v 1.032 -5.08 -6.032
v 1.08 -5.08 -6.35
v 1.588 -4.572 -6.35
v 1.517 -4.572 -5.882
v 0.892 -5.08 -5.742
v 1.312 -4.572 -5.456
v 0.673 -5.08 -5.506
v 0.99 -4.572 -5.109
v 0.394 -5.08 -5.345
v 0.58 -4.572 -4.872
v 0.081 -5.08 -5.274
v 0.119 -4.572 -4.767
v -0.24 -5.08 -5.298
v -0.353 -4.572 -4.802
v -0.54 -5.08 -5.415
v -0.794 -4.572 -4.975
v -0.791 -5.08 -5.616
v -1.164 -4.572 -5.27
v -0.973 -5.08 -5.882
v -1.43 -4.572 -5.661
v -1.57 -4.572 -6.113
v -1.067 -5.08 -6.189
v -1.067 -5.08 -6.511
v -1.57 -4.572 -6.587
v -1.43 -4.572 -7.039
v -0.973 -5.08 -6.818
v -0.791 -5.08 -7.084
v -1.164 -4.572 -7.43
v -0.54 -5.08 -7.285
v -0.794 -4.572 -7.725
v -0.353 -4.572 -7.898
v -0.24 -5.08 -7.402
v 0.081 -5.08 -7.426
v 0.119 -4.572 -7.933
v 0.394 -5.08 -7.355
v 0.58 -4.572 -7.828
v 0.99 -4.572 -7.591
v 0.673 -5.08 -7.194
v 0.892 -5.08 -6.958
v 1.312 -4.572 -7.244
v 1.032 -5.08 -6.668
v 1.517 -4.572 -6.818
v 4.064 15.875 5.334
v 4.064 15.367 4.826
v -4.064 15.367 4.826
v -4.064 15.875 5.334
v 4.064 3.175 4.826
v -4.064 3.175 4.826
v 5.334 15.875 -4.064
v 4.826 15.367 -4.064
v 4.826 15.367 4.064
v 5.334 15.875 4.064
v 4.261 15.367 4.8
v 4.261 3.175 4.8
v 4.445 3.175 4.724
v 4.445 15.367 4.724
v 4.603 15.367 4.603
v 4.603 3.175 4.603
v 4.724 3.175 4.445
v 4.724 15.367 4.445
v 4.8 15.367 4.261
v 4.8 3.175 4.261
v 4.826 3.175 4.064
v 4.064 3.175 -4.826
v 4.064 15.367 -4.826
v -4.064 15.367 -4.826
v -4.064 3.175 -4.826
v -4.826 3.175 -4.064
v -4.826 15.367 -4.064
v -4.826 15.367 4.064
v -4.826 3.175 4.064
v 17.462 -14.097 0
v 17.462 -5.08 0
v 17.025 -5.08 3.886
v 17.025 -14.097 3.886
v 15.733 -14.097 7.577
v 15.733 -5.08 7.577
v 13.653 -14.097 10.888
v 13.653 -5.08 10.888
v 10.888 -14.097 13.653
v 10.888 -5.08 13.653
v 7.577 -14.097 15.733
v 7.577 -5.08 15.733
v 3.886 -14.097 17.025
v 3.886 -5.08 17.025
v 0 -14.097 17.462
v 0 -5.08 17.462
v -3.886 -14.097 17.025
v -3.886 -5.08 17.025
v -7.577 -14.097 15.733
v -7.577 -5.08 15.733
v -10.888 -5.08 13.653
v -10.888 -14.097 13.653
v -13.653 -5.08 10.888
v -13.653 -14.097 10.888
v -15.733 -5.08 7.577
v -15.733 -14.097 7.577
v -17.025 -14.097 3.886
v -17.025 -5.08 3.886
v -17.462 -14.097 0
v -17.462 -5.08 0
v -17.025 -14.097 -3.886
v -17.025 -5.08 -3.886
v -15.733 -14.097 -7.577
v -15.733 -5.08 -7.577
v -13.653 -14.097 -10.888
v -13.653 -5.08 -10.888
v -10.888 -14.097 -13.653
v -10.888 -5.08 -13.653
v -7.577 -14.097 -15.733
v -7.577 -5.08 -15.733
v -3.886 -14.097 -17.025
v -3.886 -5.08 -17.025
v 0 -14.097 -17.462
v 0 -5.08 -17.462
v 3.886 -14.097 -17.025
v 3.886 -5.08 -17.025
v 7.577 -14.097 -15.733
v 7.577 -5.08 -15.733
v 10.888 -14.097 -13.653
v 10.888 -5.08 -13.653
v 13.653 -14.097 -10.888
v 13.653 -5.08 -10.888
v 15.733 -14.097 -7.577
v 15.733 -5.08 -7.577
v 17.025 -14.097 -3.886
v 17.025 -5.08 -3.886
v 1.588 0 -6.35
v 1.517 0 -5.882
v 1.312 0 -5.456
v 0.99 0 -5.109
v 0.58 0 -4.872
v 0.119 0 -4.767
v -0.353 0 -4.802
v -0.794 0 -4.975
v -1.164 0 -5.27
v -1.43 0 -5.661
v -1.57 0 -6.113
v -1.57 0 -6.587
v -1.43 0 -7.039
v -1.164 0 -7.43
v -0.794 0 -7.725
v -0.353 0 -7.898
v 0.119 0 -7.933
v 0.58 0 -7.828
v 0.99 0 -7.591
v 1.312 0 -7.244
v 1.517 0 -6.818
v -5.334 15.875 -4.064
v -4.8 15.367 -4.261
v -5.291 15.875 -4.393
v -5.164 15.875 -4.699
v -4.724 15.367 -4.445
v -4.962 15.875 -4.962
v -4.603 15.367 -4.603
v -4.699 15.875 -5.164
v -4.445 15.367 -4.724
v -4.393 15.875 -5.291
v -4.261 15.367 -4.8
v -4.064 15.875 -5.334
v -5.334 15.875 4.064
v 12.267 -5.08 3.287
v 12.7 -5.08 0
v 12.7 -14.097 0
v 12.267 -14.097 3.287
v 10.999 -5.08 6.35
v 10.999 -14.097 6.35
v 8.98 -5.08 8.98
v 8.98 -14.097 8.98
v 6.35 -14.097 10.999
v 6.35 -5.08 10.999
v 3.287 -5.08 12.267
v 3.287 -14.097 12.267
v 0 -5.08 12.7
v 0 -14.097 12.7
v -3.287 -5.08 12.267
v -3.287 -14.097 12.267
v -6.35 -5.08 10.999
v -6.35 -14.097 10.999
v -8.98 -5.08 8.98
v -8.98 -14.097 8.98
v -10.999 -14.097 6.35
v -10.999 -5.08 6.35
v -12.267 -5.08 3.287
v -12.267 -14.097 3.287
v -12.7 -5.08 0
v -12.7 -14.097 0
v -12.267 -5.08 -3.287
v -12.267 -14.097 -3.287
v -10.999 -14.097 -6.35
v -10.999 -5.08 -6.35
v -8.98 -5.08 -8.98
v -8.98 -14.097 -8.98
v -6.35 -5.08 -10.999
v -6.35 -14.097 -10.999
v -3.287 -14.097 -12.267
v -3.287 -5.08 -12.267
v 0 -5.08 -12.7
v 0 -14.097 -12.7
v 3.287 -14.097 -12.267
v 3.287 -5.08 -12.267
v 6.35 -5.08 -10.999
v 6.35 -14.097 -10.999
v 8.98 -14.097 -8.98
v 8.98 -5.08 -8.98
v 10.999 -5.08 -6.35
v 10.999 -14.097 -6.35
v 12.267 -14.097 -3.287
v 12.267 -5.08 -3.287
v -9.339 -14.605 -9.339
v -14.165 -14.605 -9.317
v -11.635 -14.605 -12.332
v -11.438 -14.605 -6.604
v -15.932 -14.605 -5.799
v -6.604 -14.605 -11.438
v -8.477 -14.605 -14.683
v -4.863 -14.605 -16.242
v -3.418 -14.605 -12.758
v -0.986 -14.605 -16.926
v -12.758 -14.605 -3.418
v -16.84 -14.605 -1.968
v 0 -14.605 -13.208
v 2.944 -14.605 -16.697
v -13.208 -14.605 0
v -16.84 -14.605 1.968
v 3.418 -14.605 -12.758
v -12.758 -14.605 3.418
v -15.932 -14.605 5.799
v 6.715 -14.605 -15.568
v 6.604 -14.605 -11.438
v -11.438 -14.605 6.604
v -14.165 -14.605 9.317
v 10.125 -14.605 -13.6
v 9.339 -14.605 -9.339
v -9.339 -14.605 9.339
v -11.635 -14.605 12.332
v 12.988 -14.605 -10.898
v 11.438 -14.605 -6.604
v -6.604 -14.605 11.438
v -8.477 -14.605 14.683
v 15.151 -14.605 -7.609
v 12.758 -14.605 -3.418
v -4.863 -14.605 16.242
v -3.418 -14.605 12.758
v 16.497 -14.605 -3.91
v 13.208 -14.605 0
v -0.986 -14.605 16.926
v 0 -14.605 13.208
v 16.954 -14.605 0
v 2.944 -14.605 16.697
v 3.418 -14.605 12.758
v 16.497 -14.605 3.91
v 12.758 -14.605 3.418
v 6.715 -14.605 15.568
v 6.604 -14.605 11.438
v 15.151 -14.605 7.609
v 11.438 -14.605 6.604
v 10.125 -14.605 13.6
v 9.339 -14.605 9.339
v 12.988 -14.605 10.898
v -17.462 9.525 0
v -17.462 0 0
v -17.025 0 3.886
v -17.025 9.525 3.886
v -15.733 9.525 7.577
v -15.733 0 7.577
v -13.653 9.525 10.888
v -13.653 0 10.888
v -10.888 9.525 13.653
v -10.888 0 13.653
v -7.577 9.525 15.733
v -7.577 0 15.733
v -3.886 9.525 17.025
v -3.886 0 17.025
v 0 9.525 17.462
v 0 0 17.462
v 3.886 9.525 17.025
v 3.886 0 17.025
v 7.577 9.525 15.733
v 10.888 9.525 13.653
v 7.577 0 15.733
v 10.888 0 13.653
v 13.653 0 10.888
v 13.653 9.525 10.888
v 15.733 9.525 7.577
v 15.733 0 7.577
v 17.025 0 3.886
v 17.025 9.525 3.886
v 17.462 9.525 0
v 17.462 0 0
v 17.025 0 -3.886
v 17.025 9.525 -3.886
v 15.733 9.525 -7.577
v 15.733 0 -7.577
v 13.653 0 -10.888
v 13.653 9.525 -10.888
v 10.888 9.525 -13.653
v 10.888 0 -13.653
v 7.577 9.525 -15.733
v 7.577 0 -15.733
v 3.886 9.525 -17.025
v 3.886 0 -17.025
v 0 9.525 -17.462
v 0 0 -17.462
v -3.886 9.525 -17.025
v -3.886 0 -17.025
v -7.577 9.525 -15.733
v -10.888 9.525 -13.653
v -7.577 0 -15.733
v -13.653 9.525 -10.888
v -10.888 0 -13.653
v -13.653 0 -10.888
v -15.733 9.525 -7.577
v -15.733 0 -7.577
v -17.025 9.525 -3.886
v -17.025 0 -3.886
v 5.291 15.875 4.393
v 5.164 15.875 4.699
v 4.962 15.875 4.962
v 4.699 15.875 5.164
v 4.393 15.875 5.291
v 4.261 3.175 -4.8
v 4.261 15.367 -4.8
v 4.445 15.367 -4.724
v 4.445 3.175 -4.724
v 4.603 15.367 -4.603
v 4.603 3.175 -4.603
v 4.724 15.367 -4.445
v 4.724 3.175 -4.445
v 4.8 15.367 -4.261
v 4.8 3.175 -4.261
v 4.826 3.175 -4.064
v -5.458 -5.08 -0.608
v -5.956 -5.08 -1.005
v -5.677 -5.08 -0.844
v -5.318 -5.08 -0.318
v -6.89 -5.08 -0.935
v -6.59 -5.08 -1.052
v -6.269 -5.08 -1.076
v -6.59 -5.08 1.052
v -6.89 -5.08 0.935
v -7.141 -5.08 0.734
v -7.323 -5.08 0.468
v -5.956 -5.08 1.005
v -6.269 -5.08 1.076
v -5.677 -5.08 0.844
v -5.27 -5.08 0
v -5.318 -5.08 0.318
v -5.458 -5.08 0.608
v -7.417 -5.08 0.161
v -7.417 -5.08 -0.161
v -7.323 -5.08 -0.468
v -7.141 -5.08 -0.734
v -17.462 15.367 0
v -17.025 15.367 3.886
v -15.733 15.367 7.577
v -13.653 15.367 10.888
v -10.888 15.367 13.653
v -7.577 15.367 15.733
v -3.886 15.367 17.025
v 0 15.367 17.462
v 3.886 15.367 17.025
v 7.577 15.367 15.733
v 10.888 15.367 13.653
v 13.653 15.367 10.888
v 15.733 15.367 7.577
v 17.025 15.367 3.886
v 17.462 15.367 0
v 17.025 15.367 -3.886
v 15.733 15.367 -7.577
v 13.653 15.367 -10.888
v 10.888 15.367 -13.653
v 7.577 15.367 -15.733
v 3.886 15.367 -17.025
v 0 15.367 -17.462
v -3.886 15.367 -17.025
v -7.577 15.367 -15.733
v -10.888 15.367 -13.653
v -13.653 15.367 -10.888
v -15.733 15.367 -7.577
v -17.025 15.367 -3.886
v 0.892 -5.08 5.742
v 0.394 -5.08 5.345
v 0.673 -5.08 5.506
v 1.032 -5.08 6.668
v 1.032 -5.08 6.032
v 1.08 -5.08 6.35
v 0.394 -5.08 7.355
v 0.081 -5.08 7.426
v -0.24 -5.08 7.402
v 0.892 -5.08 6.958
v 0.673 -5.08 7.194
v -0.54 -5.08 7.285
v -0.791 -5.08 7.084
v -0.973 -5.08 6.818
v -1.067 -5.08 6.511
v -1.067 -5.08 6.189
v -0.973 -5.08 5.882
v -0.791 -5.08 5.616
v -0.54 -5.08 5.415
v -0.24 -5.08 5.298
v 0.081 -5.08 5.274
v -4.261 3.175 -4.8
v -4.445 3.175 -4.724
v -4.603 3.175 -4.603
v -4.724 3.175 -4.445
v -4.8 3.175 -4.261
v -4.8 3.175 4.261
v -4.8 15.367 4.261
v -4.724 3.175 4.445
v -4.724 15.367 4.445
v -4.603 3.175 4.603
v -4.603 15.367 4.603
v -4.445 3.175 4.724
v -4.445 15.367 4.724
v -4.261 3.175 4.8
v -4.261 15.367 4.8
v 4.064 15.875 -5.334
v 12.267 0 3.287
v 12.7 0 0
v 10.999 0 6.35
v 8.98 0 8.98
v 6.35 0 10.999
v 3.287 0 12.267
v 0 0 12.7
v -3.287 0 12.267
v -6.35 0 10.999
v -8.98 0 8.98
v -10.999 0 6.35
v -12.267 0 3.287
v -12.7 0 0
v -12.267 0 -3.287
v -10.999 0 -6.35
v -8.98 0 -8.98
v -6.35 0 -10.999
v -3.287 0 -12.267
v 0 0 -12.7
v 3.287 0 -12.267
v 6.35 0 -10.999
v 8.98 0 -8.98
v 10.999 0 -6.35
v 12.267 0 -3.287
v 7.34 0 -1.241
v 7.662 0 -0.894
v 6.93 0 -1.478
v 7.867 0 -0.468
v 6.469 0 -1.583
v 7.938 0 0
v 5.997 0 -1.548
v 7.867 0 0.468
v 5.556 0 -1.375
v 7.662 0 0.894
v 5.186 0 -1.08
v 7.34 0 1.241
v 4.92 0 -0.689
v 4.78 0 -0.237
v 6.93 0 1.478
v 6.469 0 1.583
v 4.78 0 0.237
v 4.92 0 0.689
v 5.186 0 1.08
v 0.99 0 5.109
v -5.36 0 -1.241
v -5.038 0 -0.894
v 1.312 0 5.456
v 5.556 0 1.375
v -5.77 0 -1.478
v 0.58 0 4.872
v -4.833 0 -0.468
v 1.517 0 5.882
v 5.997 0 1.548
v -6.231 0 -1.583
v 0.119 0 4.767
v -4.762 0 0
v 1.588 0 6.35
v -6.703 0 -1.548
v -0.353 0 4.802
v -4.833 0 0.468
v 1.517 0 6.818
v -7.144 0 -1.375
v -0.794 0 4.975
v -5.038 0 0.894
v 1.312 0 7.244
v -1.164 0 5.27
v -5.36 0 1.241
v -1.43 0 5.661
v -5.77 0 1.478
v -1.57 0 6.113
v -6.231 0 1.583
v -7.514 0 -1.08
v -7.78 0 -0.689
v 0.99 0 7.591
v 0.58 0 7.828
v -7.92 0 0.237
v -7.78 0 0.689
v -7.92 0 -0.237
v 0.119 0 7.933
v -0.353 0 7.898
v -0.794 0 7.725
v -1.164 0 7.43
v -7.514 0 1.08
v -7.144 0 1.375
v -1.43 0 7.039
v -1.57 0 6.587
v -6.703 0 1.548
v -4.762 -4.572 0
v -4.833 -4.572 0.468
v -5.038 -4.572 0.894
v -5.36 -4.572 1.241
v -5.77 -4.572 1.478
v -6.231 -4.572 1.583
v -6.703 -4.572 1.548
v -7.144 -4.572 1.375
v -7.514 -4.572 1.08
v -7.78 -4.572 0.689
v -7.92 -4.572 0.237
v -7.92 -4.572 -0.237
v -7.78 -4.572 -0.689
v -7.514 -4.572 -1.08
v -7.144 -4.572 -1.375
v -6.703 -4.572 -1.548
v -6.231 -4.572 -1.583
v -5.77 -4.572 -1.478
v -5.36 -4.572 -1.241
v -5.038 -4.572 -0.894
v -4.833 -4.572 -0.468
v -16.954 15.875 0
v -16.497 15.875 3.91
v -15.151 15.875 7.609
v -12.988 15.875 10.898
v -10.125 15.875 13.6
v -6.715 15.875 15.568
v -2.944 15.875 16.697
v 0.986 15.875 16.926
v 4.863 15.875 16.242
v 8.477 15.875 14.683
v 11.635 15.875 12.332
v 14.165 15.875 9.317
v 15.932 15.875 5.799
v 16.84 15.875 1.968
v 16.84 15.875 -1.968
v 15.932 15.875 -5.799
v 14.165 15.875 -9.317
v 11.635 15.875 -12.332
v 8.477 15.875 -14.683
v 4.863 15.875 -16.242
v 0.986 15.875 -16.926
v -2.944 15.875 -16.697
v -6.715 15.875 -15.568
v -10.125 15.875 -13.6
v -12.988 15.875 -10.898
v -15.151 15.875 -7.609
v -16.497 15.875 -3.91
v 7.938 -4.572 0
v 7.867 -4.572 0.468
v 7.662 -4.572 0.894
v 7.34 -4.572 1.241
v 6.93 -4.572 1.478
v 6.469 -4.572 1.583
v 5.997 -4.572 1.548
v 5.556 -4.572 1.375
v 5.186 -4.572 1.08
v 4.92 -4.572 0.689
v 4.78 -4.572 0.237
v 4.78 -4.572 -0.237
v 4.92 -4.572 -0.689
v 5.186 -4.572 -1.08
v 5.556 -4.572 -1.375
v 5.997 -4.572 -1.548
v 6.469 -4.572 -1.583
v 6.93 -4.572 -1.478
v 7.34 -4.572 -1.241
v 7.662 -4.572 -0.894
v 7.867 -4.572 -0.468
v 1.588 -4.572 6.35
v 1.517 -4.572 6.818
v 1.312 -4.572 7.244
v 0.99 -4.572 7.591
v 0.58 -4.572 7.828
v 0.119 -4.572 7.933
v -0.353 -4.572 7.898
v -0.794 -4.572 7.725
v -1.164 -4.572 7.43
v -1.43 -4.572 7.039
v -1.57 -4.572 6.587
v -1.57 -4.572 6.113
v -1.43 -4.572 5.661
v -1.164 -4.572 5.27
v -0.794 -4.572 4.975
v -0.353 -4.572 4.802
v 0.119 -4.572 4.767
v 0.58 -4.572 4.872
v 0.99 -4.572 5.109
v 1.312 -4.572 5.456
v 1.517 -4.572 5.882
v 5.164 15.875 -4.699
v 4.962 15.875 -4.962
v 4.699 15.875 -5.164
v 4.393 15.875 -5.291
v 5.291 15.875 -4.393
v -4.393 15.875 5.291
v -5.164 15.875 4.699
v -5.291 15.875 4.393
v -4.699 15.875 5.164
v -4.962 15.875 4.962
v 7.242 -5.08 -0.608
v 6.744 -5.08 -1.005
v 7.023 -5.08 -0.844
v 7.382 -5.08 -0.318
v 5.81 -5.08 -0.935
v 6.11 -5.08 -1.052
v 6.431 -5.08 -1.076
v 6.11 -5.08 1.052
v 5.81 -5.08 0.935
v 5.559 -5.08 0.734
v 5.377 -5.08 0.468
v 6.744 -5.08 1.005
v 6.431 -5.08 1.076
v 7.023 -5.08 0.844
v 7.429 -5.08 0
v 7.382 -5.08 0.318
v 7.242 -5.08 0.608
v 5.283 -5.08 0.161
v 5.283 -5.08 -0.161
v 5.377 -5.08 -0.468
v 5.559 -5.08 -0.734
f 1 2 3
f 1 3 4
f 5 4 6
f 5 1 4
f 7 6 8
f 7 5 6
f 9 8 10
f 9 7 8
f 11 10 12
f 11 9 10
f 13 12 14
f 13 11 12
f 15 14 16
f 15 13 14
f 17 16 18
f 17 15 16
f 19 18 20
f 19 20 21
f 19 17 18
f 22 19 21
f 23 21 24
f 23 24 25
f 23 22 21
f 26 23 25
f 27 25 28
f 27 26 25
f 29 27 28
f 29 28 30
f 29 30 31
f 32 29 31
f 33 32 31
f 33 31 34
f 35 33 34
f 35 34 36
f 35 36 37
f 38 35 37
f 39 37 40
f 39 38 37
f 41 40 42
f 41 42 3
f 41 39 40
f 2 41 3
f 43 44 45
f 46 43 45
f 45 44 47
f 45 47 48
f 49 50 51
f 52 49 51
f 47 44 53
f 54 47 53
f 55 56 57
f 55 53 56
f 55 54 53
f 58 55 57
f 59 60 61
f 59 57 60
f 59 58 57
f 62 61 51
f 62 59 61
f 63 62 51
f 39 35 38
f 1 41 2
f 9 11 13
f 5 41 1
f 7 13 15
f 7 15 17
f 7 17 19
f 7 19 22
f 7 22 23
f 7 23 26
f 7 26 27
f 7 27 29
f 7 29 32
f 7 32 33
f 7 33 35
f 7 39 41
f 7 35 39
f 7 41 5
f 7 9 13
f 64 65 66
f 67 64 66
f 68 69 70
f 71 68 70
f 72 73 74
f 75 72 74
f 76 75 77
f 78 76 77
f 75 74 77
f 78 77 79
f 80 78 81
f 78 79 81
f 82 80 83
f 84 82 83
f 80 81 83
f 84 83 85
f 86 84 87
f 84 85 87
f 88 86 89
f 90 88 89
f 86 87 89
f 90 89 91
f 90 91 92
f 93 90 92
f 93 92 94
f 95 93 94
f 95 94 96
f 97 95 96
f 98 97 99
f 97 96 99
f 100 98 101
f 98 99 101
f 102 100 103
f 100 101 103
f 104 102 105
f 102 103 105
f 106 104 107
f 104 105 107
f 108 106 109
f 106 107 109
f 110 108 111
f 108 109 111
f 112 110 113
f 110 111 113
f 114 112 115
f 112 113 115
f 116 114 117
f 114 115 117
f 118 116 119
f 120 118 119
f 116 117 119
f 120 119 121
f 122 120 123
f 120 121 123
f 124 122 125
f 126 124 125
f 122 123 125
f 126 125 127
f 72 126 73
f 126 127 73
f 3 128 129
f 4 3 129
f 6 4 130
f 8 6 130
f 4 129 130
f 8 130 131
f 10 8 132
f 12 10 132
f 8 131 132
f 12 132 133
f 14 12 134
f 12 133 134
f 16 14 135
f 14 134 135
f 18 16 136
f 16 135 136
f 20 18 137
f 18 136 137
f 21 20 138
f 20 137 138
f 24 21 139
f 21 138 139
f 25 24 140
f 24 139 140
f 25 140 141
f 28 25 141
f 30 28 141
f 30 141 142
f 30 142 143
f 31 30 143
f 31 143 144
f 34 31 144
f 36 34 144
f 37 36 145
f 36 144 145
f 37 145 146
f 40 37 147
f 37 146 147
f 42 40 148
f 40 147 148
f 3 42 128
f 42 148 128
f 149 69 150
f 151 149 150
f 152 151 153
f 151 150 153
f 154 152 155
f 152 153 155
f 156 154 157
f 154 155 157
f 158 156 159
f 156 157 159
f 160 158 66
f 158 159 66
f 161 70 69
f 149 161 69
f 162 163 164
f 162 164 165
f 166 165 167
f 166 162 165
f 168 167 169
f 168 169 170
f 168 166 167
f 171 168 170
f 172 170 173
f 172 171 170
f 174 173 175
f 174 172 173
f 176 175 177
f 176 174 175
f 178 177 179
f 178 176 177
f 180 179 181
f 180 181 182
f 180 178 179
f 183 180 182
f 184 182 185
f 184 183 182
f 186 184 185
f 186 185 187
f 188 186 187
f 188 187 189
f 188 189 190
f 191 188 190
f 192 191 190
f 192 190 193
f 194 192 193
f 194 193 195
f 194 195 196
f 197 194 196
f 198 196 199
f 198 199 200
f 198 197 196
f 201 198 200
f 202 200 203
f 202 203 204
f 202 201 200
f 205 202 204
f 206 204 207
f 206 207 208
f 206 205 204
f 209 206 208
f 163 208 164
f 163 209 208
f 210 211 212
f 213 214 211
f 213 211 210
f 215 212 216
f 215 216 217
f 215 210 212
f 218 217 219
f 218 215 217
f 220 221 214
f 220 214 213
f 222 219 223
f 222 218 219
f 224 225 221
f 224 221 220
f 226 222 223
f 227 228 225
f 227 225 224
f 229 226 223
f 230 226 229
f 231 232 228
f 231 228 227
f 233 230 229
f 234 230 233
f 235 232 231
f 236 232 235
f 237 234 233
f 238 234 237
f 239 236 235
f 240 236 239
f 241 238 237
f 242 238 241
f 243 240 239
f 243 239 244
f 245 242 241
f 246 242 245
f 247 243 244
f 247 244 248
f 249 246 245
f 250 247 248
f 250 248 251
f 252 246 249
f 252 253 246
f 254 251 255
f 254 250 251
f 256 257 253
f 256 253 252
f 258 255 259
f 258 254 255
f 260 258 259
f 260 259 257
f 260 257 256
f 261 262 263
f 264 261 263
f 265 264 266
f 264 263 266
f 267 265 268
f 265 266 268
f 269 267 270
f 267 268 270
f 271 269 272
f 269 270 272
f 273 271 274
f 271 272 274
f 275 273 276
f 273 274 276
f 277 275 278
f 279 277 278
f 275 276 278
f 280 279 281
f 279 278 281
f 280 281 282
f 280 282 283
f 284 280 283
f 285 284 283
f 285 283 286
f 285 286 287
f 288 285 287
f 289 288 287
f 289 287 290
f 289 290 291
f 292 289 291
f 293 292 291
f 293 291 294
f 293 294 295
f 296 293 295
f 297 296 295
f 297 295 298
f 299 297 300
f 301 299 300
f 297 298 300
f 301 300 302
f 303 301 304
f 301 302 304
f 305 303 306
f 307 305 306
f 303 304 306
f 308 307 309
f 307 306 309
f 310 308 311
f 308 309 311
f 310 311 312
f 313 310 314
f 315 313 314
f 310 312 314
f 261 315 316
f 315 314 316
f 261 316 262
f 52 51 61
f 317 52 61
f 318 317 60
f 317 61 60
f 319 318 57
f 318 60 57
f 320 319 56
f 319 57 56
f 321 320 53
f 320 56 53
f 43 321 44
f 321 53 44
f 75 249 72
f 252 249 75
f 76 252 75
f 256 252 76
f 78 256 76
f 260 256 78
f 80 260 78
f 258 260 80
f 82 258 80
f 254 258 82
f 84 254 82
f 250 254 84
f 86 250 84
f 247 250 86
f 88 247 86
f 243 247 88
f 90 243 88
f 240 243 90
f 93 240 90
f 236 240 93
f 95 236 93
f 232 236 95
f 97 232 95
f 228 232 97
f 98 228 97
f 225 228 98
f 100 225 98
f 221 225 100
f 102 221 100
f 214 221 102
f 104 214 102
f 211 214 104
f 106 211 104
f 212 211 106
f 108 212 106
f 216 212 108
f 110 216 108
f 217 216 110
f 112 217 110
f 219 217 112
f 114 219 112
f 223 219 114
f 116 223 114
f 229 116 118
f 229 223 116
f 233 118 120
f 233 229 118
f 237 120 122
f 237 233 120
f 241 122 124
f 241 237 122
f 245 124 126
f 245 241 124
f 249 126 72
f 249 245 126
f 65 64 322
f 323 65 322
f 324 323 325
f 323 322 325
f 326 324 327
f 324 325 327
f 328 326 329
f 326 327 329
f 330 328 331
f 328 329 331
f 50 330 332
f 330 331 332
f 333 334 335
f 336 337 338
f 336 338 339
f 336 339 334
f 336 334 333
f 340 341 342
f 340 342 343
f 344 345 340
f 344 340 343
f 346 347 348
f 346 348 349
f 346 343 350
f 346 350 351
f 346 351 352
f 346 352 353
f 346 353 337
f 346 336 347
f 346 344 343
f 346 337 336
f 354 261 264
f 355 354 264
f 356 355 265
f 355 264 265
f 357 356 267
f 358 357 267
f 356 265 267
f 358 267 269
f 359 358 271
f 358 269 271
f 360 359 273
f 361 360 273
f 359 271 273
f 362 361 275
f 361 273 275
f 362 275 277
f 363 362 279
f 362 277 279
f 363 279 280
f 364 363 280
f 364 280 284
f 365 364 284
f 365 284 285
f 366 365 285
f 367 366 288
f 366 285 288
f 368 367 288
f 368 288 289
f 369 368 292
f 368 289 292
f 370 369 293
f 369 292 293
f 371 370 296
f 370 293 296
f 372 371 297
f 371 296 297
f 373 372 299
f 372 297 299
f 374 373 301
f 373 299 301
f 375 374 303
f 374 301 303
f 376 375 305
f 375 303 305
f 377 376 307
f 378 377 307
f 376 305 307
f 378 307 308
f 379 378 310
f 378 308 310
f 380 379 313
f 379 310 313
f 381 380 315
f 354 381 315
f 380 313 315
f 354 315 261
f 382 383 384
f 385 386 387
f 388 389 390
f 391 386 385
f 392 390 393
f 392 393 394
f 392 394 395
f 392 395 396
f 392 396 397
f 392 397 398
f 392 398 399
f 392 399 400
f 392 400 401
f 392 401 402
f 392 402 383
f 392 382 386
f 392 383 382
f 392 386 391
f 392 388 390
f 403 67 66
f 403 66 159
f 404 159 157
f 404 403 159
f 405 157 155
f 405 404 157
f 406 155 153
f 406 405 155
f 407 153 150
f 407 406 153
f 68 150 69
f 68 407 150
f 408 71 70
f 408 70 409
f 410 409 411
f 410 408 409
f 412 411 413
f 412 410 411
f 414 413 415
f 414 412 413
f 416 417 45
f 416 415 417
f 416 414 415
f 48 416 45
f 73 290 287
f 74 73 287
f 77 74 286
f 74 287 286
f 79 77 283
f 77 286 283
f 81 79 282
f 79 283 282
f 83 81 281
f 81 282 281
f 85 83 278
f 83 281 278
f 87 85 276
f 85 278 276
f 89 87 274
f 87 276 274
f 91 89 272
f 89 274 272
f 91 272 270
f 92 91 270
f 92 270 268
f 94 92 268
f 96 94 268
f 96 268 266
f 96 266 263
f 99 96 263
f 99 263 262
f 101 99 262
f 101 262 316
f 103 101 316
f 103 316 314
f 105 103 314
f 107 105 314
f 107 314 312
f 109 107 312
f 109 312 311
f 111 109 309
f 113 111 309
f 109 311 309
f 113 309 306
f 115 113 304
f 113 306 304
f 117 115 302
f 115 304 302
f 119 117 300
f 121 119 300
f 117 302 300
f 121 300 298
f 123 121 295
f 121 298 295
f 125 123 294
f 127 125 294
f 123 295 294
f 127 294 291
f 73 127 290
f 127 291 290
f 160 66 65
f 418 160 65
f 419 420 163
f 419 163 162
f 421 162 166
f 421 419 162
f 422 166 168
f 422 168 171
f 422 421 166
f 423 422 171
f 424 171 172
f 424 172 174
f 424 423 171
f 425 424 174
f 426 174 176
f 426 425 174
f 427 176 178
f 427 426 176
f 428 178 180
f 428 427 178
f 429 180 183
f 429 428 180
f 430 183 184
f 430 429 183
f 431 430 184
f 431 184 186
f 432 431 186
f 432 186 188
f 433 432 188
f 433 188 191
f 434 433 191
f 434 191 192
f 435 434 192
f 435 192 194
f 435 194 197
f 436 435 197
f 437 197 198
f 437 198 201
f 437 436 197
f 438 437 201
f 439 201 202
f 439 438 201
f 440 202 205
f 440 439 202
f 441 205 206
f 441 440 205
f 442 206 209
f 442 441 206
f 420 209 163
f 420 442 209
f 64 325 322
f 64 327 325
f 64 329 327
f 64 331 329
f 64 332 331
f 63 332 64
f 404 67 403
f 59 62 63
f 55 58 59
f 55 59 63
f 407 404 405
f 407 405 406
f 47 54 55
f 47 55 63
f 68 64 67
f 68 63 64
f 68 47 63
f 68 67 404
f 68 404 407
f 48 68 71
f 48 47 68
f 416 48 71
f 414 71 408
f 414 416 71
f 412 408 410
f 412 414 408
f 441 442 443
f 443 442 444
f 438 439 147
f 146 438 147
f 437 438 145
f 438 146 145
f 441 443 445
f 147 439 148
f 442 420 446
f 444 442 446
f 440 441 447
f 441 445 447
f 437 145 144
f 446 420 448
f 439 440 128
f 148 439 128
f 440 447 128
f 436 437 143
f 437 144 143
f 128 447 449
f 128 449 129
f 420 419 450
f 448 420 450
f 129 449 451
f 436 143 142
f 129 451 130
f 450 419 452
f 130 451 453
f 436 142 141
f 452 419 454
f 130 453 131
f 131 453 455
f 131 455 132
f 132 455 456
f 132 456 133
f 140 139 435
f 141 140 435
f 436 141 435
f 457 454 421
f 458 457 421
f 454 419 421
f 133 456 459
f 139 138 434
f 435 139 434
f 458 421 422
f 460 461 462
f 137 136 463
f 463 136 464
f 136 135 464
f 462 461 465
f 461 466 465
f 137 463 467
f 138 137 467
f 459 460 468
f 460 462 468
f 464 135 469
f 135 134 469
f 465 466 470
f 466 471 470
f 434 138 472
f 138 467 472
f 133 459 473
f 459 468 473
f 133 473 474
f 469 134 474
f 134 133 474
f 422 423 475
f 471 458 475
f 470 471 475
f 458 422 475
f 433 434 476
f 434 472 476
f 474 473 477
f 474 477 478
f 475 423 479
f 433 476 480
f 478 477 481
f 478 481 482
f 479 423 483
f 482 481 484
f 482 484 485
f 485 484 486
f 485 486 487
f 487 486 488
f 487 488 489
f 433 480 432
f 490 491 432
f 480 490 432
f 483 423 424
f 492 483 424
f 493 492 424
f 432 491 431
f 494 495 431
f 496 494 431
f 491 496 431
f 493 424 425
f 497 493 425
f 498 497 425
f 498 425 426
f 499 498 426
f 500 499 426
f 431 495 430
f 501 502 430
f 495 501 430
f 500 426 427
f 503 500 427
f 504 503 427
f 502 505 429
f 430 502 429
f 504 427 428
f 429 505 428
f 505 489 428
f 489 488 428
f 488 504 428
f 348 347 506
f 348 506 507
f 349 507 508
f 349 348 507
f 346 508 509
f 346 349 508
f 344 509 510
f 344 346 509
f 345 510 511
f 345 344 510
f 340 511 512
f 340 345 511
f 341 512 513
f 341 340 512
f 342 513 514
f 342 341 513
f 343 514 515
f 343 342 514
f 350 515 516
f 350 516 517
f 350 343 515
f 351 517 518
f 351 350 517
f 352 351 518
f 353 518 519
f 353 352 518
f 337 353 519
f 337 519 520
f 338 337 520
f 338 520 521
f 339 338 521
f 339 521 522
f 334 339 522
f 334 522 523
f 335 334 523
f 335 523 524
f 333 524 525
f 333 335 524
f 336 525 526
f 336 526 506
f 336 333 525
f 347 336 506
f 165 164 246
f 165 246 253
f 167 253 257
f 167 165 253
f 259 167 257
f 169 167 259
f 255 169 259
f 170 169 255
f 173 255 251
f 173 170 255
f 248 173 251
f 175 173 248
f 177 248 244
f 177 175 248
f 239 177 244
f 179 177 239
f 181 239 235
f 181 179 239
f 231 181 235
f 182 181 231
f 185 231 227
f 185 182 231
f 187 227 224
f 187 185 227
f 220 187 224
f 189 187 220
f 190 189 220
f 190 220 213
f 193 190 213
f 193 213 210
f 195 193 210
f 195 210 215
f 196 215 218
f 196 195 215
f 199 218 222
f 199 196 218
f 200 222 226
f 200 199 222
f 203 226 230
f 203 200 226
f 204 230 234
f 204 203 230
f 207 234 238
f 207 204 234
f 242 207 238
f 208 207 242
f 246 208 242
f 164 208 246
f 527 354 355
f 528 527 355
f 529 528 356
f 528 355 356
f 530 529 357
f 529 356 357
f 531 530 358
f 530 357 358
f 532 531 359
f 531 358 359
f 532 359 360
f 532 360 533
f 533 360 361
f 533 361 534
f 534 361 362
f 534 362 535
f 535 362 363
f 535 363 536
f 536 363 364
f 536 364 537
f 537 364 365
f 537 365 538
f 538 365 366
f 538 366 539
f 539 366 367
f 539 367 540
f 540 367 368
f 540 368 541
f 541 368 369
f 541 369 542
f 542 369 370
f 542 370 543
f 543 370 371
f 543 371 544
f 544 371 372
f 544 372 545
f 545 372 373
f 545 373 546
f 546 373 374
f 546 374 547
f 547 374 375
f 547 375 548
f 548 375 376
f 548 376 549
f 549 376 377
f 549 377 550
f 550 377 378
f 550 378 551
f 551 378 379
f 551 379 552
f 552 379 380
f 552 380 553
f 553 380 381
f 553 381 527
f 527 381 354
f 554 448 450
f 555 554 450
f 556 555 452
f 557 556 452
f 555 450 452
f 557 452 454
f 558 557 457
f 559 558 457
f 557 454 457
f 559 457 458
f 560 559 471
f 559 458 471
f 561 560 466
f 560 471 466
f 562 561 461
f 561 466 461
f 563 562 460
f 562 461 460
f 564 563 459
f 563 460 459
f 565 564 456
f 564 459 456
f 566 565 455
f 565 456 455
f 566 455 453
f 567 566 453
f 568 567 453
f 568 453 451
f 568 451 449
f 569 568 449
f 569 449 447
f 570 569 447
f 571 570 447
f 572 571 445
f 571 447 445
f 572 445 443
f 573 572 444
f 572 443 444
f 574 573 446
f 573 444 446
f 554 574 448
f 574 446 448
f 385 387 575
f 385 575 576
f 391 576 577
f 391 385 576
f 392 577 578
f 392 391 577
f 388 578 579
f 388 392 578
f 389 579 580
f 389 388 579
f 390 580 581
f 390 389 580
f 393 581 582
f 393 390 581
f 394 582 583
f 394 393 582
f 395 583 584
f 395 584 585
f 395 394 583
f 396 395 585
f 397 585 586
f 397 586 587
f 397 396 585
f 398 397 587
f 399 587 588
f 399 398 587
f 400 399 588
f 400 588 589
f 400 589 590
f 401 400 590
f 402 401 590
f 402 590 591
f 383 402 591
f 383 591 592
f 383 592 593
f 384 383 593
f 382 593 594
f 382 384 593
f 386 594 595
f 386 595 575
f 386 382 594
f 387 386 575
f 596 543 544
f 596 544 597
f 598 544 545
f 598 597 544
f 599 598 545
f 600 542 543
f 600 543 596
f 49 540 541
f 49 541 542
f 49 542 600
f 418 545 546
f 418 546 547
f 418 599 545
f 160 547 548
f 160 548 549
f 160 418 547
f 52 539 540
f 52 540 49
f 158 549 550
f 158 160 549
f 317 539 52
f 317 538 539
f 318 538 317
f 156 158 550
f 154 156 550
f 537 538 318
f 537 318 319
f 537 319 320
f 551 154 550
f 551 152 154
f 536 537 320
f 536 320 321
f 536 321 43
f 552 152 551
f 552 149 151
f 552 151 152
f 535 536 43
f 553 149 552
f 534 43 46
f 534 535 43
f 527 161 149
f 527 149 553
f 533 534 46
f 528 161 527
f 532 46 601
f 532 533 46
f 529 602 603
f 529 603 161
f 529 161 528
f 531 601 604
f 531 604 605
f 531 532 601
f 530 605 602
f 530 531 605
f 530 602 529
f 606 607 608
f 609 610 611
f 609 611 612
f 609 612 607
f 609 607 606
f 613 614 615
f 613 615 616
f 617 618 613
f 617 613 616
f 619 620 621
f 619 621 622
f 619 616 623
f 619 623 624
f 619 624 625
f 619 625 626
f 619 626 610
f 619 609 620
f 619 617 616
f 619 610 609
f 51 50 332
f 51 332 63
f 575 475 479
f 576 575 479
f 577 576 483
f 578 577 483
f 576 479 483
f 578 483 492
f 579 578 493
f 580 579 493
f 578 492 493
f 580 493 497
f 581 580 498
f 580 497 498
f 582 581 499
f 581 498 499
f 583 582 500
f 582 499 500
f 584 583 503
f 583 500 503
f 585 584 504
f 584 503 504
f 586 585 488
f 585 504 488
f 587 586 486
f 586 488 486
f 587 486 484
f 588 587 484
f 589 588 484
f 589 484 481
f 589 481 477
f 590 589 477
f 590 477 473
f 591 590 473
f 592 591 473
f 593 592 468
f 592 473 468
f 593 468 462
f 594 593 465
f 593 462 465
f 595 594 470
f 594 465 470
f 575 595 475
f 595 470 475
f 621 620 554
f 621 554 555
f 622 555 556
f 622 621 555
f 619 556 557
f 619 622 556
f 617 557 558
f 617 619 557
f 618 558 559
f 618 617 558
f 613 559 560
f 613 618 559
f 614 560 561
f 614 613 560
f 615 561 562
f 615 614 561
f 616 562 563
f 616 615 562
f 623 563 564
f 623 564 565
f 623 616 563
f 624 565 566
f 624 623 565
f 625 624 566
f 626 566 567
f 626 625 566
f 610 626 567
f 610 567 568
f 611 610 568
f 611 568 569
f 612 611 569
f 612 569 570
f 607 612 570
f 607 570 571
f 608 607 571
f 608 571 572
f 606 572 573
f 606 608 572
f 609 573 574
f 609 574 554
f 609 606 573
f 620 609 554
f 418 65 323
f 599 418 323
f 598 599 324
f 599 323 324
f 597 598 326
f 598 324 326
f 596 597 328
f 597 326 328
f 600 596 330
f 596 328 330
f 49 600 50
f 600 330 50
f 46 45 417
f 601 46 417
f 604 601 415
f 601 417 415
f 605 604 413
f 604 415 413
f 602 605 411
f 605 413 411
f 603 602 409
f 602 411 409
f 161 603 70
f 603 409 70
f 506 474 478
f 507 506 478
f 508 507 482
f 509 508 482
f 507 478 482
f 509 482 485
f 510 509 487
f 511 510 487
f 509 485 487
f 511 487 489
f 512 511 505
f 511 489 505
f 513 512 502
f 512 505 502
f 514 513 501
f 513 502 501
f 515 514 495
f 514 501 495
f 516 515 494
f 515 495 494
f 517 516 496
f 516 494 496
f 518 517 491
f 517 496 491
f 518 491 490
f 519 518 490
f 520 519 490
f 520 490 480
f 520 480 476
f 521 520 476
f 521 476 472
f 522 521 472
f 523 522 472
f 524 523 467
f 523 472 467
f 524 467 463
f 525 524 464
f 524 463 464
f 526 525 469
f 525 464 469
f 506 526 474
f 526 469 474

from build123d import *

# Parameters (mm, degrees)
F0_R     = 17.4625
F0_R_2   = 12.7
F1_DEPTH = 5.08
F0_R_3   = 1.5875
F2_R     = 17.4625
F3_DEPTH = 9.525
F4_DEPTH = 9.525
F5_DEPTH = 6.35
F6_W     = 9.652
F6_H     = 9.652
F7_DEPTH = 12.7
F8_R     = 0.762
F9_SIZE  = 0.508


with BuildPart() as f1:
    # F0 (on Front) → F1 (new body)
    with BuildSketch(Plane.XZ):
        Circle(F0_R)
        Circle(F0_R_2, mode=Mode.SUBTRACT)
    extrude(amount=F1_DEPTH)



with BuildPart() as f1b:
    # F0 (on Front) → F1, piece 2 (new body)
    with BuildSketch(Plane.XZ):
        with Locations((0, 6.35)):
            Circle(F0_R_3)
    extrude(amount=F1_DEPTH)


with BuildPart() as f1c:
    # F0 (on Front) → F1, piece 3 (new body)
    with BuildSketch(Plane.XZ):
        with Locations((6.35, 0)):
            Circle(F0_R_3)
    extrude(amount=F1_DEPTH)


with BuildPart() as f1d:
    # F0 (on Front) → F1, piece 4 (new body)
    with BuildSketch(Plane.XZ):
        with Locations((0, -6.35)):
            Circle(F0_R_3)
    extrude(amount=F1_DEPTH)


with BuildPart() as f1e:
    # F0 (on Front) → F1, piece 5 (new body)
    with BuildSketch(Plane.XZ):
        with Locations((-6.35, 0)):
            Circle(F0_R_3)
    extrude(amount=F1_DEPTH)


with BuildPart() as f1_1:
    add(f1.part)

    add(f1b.part)  # F3 merges F1b

    add(f1c.part)  # F3 merges F1c

    add(f1d.part)  # F3 merges F1d

    add(f1e.part)  # F3 merges F1e
    # F2 (on face) → F3 (join)
    with BuildSketch(Plane(origin=(0, 0, 0), x_dir=(-1, 0, 0), z_dir=(0, 1, 0))):
        Circle(F2_R)
    extrude(amount=F3_DEPTH)

    # F4 (add): a face of the model
    f4_faces = [f1_1.faces().sort_by_distance(p)[0] for p in [
        (-16.9685859133, -5.08, 0),
    ]]
    extrude(f4_faces, amount=F4_DEPTH)

    # F5 (add): a face of the model
    f5_faces = [f1_1.faces().sort_by_distance(p)[0] for p in [
        (0, 9.525, 0),
    ]]
    extrude(f5_faces, amount=F5_DEPTH)

    # F6 (on face) → F7 (cut)
    with BuildSketch(Plane(origin=(0, 15.875, 0), x_dir=(-1, 0, 0), z_dir=(0, 1, 0))):
        Rectangle(F6_W, F6_H)
    extrude(amount=-F7_DEPTH, mode=Mode.SUBTRACT)

    # F8
    f8_edges = [f1_1.edges().sort_by_distance(p)[0] for p in [
        (4.826, 9.525, 4.826),
        (4.826, 9.525, -4.826),
        (-4.826, 9.525, -4.826),
        (-4.826, 9.525, 4.826),
    ]]
    fillet(f8_edges, radius=F8_R)

    # F9
    f9_edges = [f1_1.edges().sort_by_distance(p)[0] for p in [
        (0, 15.875, 4.826),
        (17.4625, 15.875, 0),
        (-17.4625, -14.605, 0),
        (-12.7, -14.605, 0),
        (-1.5875, -5.08, -6.35),
        (4.7625, -5.08, 0),
        (-1.5875, -5.08, 6.35),
        (-7.9375, -5.08, 0),
    ]]
    chamfer(f9_edges, length=F9_SIZE)


solid = f1_1.part
